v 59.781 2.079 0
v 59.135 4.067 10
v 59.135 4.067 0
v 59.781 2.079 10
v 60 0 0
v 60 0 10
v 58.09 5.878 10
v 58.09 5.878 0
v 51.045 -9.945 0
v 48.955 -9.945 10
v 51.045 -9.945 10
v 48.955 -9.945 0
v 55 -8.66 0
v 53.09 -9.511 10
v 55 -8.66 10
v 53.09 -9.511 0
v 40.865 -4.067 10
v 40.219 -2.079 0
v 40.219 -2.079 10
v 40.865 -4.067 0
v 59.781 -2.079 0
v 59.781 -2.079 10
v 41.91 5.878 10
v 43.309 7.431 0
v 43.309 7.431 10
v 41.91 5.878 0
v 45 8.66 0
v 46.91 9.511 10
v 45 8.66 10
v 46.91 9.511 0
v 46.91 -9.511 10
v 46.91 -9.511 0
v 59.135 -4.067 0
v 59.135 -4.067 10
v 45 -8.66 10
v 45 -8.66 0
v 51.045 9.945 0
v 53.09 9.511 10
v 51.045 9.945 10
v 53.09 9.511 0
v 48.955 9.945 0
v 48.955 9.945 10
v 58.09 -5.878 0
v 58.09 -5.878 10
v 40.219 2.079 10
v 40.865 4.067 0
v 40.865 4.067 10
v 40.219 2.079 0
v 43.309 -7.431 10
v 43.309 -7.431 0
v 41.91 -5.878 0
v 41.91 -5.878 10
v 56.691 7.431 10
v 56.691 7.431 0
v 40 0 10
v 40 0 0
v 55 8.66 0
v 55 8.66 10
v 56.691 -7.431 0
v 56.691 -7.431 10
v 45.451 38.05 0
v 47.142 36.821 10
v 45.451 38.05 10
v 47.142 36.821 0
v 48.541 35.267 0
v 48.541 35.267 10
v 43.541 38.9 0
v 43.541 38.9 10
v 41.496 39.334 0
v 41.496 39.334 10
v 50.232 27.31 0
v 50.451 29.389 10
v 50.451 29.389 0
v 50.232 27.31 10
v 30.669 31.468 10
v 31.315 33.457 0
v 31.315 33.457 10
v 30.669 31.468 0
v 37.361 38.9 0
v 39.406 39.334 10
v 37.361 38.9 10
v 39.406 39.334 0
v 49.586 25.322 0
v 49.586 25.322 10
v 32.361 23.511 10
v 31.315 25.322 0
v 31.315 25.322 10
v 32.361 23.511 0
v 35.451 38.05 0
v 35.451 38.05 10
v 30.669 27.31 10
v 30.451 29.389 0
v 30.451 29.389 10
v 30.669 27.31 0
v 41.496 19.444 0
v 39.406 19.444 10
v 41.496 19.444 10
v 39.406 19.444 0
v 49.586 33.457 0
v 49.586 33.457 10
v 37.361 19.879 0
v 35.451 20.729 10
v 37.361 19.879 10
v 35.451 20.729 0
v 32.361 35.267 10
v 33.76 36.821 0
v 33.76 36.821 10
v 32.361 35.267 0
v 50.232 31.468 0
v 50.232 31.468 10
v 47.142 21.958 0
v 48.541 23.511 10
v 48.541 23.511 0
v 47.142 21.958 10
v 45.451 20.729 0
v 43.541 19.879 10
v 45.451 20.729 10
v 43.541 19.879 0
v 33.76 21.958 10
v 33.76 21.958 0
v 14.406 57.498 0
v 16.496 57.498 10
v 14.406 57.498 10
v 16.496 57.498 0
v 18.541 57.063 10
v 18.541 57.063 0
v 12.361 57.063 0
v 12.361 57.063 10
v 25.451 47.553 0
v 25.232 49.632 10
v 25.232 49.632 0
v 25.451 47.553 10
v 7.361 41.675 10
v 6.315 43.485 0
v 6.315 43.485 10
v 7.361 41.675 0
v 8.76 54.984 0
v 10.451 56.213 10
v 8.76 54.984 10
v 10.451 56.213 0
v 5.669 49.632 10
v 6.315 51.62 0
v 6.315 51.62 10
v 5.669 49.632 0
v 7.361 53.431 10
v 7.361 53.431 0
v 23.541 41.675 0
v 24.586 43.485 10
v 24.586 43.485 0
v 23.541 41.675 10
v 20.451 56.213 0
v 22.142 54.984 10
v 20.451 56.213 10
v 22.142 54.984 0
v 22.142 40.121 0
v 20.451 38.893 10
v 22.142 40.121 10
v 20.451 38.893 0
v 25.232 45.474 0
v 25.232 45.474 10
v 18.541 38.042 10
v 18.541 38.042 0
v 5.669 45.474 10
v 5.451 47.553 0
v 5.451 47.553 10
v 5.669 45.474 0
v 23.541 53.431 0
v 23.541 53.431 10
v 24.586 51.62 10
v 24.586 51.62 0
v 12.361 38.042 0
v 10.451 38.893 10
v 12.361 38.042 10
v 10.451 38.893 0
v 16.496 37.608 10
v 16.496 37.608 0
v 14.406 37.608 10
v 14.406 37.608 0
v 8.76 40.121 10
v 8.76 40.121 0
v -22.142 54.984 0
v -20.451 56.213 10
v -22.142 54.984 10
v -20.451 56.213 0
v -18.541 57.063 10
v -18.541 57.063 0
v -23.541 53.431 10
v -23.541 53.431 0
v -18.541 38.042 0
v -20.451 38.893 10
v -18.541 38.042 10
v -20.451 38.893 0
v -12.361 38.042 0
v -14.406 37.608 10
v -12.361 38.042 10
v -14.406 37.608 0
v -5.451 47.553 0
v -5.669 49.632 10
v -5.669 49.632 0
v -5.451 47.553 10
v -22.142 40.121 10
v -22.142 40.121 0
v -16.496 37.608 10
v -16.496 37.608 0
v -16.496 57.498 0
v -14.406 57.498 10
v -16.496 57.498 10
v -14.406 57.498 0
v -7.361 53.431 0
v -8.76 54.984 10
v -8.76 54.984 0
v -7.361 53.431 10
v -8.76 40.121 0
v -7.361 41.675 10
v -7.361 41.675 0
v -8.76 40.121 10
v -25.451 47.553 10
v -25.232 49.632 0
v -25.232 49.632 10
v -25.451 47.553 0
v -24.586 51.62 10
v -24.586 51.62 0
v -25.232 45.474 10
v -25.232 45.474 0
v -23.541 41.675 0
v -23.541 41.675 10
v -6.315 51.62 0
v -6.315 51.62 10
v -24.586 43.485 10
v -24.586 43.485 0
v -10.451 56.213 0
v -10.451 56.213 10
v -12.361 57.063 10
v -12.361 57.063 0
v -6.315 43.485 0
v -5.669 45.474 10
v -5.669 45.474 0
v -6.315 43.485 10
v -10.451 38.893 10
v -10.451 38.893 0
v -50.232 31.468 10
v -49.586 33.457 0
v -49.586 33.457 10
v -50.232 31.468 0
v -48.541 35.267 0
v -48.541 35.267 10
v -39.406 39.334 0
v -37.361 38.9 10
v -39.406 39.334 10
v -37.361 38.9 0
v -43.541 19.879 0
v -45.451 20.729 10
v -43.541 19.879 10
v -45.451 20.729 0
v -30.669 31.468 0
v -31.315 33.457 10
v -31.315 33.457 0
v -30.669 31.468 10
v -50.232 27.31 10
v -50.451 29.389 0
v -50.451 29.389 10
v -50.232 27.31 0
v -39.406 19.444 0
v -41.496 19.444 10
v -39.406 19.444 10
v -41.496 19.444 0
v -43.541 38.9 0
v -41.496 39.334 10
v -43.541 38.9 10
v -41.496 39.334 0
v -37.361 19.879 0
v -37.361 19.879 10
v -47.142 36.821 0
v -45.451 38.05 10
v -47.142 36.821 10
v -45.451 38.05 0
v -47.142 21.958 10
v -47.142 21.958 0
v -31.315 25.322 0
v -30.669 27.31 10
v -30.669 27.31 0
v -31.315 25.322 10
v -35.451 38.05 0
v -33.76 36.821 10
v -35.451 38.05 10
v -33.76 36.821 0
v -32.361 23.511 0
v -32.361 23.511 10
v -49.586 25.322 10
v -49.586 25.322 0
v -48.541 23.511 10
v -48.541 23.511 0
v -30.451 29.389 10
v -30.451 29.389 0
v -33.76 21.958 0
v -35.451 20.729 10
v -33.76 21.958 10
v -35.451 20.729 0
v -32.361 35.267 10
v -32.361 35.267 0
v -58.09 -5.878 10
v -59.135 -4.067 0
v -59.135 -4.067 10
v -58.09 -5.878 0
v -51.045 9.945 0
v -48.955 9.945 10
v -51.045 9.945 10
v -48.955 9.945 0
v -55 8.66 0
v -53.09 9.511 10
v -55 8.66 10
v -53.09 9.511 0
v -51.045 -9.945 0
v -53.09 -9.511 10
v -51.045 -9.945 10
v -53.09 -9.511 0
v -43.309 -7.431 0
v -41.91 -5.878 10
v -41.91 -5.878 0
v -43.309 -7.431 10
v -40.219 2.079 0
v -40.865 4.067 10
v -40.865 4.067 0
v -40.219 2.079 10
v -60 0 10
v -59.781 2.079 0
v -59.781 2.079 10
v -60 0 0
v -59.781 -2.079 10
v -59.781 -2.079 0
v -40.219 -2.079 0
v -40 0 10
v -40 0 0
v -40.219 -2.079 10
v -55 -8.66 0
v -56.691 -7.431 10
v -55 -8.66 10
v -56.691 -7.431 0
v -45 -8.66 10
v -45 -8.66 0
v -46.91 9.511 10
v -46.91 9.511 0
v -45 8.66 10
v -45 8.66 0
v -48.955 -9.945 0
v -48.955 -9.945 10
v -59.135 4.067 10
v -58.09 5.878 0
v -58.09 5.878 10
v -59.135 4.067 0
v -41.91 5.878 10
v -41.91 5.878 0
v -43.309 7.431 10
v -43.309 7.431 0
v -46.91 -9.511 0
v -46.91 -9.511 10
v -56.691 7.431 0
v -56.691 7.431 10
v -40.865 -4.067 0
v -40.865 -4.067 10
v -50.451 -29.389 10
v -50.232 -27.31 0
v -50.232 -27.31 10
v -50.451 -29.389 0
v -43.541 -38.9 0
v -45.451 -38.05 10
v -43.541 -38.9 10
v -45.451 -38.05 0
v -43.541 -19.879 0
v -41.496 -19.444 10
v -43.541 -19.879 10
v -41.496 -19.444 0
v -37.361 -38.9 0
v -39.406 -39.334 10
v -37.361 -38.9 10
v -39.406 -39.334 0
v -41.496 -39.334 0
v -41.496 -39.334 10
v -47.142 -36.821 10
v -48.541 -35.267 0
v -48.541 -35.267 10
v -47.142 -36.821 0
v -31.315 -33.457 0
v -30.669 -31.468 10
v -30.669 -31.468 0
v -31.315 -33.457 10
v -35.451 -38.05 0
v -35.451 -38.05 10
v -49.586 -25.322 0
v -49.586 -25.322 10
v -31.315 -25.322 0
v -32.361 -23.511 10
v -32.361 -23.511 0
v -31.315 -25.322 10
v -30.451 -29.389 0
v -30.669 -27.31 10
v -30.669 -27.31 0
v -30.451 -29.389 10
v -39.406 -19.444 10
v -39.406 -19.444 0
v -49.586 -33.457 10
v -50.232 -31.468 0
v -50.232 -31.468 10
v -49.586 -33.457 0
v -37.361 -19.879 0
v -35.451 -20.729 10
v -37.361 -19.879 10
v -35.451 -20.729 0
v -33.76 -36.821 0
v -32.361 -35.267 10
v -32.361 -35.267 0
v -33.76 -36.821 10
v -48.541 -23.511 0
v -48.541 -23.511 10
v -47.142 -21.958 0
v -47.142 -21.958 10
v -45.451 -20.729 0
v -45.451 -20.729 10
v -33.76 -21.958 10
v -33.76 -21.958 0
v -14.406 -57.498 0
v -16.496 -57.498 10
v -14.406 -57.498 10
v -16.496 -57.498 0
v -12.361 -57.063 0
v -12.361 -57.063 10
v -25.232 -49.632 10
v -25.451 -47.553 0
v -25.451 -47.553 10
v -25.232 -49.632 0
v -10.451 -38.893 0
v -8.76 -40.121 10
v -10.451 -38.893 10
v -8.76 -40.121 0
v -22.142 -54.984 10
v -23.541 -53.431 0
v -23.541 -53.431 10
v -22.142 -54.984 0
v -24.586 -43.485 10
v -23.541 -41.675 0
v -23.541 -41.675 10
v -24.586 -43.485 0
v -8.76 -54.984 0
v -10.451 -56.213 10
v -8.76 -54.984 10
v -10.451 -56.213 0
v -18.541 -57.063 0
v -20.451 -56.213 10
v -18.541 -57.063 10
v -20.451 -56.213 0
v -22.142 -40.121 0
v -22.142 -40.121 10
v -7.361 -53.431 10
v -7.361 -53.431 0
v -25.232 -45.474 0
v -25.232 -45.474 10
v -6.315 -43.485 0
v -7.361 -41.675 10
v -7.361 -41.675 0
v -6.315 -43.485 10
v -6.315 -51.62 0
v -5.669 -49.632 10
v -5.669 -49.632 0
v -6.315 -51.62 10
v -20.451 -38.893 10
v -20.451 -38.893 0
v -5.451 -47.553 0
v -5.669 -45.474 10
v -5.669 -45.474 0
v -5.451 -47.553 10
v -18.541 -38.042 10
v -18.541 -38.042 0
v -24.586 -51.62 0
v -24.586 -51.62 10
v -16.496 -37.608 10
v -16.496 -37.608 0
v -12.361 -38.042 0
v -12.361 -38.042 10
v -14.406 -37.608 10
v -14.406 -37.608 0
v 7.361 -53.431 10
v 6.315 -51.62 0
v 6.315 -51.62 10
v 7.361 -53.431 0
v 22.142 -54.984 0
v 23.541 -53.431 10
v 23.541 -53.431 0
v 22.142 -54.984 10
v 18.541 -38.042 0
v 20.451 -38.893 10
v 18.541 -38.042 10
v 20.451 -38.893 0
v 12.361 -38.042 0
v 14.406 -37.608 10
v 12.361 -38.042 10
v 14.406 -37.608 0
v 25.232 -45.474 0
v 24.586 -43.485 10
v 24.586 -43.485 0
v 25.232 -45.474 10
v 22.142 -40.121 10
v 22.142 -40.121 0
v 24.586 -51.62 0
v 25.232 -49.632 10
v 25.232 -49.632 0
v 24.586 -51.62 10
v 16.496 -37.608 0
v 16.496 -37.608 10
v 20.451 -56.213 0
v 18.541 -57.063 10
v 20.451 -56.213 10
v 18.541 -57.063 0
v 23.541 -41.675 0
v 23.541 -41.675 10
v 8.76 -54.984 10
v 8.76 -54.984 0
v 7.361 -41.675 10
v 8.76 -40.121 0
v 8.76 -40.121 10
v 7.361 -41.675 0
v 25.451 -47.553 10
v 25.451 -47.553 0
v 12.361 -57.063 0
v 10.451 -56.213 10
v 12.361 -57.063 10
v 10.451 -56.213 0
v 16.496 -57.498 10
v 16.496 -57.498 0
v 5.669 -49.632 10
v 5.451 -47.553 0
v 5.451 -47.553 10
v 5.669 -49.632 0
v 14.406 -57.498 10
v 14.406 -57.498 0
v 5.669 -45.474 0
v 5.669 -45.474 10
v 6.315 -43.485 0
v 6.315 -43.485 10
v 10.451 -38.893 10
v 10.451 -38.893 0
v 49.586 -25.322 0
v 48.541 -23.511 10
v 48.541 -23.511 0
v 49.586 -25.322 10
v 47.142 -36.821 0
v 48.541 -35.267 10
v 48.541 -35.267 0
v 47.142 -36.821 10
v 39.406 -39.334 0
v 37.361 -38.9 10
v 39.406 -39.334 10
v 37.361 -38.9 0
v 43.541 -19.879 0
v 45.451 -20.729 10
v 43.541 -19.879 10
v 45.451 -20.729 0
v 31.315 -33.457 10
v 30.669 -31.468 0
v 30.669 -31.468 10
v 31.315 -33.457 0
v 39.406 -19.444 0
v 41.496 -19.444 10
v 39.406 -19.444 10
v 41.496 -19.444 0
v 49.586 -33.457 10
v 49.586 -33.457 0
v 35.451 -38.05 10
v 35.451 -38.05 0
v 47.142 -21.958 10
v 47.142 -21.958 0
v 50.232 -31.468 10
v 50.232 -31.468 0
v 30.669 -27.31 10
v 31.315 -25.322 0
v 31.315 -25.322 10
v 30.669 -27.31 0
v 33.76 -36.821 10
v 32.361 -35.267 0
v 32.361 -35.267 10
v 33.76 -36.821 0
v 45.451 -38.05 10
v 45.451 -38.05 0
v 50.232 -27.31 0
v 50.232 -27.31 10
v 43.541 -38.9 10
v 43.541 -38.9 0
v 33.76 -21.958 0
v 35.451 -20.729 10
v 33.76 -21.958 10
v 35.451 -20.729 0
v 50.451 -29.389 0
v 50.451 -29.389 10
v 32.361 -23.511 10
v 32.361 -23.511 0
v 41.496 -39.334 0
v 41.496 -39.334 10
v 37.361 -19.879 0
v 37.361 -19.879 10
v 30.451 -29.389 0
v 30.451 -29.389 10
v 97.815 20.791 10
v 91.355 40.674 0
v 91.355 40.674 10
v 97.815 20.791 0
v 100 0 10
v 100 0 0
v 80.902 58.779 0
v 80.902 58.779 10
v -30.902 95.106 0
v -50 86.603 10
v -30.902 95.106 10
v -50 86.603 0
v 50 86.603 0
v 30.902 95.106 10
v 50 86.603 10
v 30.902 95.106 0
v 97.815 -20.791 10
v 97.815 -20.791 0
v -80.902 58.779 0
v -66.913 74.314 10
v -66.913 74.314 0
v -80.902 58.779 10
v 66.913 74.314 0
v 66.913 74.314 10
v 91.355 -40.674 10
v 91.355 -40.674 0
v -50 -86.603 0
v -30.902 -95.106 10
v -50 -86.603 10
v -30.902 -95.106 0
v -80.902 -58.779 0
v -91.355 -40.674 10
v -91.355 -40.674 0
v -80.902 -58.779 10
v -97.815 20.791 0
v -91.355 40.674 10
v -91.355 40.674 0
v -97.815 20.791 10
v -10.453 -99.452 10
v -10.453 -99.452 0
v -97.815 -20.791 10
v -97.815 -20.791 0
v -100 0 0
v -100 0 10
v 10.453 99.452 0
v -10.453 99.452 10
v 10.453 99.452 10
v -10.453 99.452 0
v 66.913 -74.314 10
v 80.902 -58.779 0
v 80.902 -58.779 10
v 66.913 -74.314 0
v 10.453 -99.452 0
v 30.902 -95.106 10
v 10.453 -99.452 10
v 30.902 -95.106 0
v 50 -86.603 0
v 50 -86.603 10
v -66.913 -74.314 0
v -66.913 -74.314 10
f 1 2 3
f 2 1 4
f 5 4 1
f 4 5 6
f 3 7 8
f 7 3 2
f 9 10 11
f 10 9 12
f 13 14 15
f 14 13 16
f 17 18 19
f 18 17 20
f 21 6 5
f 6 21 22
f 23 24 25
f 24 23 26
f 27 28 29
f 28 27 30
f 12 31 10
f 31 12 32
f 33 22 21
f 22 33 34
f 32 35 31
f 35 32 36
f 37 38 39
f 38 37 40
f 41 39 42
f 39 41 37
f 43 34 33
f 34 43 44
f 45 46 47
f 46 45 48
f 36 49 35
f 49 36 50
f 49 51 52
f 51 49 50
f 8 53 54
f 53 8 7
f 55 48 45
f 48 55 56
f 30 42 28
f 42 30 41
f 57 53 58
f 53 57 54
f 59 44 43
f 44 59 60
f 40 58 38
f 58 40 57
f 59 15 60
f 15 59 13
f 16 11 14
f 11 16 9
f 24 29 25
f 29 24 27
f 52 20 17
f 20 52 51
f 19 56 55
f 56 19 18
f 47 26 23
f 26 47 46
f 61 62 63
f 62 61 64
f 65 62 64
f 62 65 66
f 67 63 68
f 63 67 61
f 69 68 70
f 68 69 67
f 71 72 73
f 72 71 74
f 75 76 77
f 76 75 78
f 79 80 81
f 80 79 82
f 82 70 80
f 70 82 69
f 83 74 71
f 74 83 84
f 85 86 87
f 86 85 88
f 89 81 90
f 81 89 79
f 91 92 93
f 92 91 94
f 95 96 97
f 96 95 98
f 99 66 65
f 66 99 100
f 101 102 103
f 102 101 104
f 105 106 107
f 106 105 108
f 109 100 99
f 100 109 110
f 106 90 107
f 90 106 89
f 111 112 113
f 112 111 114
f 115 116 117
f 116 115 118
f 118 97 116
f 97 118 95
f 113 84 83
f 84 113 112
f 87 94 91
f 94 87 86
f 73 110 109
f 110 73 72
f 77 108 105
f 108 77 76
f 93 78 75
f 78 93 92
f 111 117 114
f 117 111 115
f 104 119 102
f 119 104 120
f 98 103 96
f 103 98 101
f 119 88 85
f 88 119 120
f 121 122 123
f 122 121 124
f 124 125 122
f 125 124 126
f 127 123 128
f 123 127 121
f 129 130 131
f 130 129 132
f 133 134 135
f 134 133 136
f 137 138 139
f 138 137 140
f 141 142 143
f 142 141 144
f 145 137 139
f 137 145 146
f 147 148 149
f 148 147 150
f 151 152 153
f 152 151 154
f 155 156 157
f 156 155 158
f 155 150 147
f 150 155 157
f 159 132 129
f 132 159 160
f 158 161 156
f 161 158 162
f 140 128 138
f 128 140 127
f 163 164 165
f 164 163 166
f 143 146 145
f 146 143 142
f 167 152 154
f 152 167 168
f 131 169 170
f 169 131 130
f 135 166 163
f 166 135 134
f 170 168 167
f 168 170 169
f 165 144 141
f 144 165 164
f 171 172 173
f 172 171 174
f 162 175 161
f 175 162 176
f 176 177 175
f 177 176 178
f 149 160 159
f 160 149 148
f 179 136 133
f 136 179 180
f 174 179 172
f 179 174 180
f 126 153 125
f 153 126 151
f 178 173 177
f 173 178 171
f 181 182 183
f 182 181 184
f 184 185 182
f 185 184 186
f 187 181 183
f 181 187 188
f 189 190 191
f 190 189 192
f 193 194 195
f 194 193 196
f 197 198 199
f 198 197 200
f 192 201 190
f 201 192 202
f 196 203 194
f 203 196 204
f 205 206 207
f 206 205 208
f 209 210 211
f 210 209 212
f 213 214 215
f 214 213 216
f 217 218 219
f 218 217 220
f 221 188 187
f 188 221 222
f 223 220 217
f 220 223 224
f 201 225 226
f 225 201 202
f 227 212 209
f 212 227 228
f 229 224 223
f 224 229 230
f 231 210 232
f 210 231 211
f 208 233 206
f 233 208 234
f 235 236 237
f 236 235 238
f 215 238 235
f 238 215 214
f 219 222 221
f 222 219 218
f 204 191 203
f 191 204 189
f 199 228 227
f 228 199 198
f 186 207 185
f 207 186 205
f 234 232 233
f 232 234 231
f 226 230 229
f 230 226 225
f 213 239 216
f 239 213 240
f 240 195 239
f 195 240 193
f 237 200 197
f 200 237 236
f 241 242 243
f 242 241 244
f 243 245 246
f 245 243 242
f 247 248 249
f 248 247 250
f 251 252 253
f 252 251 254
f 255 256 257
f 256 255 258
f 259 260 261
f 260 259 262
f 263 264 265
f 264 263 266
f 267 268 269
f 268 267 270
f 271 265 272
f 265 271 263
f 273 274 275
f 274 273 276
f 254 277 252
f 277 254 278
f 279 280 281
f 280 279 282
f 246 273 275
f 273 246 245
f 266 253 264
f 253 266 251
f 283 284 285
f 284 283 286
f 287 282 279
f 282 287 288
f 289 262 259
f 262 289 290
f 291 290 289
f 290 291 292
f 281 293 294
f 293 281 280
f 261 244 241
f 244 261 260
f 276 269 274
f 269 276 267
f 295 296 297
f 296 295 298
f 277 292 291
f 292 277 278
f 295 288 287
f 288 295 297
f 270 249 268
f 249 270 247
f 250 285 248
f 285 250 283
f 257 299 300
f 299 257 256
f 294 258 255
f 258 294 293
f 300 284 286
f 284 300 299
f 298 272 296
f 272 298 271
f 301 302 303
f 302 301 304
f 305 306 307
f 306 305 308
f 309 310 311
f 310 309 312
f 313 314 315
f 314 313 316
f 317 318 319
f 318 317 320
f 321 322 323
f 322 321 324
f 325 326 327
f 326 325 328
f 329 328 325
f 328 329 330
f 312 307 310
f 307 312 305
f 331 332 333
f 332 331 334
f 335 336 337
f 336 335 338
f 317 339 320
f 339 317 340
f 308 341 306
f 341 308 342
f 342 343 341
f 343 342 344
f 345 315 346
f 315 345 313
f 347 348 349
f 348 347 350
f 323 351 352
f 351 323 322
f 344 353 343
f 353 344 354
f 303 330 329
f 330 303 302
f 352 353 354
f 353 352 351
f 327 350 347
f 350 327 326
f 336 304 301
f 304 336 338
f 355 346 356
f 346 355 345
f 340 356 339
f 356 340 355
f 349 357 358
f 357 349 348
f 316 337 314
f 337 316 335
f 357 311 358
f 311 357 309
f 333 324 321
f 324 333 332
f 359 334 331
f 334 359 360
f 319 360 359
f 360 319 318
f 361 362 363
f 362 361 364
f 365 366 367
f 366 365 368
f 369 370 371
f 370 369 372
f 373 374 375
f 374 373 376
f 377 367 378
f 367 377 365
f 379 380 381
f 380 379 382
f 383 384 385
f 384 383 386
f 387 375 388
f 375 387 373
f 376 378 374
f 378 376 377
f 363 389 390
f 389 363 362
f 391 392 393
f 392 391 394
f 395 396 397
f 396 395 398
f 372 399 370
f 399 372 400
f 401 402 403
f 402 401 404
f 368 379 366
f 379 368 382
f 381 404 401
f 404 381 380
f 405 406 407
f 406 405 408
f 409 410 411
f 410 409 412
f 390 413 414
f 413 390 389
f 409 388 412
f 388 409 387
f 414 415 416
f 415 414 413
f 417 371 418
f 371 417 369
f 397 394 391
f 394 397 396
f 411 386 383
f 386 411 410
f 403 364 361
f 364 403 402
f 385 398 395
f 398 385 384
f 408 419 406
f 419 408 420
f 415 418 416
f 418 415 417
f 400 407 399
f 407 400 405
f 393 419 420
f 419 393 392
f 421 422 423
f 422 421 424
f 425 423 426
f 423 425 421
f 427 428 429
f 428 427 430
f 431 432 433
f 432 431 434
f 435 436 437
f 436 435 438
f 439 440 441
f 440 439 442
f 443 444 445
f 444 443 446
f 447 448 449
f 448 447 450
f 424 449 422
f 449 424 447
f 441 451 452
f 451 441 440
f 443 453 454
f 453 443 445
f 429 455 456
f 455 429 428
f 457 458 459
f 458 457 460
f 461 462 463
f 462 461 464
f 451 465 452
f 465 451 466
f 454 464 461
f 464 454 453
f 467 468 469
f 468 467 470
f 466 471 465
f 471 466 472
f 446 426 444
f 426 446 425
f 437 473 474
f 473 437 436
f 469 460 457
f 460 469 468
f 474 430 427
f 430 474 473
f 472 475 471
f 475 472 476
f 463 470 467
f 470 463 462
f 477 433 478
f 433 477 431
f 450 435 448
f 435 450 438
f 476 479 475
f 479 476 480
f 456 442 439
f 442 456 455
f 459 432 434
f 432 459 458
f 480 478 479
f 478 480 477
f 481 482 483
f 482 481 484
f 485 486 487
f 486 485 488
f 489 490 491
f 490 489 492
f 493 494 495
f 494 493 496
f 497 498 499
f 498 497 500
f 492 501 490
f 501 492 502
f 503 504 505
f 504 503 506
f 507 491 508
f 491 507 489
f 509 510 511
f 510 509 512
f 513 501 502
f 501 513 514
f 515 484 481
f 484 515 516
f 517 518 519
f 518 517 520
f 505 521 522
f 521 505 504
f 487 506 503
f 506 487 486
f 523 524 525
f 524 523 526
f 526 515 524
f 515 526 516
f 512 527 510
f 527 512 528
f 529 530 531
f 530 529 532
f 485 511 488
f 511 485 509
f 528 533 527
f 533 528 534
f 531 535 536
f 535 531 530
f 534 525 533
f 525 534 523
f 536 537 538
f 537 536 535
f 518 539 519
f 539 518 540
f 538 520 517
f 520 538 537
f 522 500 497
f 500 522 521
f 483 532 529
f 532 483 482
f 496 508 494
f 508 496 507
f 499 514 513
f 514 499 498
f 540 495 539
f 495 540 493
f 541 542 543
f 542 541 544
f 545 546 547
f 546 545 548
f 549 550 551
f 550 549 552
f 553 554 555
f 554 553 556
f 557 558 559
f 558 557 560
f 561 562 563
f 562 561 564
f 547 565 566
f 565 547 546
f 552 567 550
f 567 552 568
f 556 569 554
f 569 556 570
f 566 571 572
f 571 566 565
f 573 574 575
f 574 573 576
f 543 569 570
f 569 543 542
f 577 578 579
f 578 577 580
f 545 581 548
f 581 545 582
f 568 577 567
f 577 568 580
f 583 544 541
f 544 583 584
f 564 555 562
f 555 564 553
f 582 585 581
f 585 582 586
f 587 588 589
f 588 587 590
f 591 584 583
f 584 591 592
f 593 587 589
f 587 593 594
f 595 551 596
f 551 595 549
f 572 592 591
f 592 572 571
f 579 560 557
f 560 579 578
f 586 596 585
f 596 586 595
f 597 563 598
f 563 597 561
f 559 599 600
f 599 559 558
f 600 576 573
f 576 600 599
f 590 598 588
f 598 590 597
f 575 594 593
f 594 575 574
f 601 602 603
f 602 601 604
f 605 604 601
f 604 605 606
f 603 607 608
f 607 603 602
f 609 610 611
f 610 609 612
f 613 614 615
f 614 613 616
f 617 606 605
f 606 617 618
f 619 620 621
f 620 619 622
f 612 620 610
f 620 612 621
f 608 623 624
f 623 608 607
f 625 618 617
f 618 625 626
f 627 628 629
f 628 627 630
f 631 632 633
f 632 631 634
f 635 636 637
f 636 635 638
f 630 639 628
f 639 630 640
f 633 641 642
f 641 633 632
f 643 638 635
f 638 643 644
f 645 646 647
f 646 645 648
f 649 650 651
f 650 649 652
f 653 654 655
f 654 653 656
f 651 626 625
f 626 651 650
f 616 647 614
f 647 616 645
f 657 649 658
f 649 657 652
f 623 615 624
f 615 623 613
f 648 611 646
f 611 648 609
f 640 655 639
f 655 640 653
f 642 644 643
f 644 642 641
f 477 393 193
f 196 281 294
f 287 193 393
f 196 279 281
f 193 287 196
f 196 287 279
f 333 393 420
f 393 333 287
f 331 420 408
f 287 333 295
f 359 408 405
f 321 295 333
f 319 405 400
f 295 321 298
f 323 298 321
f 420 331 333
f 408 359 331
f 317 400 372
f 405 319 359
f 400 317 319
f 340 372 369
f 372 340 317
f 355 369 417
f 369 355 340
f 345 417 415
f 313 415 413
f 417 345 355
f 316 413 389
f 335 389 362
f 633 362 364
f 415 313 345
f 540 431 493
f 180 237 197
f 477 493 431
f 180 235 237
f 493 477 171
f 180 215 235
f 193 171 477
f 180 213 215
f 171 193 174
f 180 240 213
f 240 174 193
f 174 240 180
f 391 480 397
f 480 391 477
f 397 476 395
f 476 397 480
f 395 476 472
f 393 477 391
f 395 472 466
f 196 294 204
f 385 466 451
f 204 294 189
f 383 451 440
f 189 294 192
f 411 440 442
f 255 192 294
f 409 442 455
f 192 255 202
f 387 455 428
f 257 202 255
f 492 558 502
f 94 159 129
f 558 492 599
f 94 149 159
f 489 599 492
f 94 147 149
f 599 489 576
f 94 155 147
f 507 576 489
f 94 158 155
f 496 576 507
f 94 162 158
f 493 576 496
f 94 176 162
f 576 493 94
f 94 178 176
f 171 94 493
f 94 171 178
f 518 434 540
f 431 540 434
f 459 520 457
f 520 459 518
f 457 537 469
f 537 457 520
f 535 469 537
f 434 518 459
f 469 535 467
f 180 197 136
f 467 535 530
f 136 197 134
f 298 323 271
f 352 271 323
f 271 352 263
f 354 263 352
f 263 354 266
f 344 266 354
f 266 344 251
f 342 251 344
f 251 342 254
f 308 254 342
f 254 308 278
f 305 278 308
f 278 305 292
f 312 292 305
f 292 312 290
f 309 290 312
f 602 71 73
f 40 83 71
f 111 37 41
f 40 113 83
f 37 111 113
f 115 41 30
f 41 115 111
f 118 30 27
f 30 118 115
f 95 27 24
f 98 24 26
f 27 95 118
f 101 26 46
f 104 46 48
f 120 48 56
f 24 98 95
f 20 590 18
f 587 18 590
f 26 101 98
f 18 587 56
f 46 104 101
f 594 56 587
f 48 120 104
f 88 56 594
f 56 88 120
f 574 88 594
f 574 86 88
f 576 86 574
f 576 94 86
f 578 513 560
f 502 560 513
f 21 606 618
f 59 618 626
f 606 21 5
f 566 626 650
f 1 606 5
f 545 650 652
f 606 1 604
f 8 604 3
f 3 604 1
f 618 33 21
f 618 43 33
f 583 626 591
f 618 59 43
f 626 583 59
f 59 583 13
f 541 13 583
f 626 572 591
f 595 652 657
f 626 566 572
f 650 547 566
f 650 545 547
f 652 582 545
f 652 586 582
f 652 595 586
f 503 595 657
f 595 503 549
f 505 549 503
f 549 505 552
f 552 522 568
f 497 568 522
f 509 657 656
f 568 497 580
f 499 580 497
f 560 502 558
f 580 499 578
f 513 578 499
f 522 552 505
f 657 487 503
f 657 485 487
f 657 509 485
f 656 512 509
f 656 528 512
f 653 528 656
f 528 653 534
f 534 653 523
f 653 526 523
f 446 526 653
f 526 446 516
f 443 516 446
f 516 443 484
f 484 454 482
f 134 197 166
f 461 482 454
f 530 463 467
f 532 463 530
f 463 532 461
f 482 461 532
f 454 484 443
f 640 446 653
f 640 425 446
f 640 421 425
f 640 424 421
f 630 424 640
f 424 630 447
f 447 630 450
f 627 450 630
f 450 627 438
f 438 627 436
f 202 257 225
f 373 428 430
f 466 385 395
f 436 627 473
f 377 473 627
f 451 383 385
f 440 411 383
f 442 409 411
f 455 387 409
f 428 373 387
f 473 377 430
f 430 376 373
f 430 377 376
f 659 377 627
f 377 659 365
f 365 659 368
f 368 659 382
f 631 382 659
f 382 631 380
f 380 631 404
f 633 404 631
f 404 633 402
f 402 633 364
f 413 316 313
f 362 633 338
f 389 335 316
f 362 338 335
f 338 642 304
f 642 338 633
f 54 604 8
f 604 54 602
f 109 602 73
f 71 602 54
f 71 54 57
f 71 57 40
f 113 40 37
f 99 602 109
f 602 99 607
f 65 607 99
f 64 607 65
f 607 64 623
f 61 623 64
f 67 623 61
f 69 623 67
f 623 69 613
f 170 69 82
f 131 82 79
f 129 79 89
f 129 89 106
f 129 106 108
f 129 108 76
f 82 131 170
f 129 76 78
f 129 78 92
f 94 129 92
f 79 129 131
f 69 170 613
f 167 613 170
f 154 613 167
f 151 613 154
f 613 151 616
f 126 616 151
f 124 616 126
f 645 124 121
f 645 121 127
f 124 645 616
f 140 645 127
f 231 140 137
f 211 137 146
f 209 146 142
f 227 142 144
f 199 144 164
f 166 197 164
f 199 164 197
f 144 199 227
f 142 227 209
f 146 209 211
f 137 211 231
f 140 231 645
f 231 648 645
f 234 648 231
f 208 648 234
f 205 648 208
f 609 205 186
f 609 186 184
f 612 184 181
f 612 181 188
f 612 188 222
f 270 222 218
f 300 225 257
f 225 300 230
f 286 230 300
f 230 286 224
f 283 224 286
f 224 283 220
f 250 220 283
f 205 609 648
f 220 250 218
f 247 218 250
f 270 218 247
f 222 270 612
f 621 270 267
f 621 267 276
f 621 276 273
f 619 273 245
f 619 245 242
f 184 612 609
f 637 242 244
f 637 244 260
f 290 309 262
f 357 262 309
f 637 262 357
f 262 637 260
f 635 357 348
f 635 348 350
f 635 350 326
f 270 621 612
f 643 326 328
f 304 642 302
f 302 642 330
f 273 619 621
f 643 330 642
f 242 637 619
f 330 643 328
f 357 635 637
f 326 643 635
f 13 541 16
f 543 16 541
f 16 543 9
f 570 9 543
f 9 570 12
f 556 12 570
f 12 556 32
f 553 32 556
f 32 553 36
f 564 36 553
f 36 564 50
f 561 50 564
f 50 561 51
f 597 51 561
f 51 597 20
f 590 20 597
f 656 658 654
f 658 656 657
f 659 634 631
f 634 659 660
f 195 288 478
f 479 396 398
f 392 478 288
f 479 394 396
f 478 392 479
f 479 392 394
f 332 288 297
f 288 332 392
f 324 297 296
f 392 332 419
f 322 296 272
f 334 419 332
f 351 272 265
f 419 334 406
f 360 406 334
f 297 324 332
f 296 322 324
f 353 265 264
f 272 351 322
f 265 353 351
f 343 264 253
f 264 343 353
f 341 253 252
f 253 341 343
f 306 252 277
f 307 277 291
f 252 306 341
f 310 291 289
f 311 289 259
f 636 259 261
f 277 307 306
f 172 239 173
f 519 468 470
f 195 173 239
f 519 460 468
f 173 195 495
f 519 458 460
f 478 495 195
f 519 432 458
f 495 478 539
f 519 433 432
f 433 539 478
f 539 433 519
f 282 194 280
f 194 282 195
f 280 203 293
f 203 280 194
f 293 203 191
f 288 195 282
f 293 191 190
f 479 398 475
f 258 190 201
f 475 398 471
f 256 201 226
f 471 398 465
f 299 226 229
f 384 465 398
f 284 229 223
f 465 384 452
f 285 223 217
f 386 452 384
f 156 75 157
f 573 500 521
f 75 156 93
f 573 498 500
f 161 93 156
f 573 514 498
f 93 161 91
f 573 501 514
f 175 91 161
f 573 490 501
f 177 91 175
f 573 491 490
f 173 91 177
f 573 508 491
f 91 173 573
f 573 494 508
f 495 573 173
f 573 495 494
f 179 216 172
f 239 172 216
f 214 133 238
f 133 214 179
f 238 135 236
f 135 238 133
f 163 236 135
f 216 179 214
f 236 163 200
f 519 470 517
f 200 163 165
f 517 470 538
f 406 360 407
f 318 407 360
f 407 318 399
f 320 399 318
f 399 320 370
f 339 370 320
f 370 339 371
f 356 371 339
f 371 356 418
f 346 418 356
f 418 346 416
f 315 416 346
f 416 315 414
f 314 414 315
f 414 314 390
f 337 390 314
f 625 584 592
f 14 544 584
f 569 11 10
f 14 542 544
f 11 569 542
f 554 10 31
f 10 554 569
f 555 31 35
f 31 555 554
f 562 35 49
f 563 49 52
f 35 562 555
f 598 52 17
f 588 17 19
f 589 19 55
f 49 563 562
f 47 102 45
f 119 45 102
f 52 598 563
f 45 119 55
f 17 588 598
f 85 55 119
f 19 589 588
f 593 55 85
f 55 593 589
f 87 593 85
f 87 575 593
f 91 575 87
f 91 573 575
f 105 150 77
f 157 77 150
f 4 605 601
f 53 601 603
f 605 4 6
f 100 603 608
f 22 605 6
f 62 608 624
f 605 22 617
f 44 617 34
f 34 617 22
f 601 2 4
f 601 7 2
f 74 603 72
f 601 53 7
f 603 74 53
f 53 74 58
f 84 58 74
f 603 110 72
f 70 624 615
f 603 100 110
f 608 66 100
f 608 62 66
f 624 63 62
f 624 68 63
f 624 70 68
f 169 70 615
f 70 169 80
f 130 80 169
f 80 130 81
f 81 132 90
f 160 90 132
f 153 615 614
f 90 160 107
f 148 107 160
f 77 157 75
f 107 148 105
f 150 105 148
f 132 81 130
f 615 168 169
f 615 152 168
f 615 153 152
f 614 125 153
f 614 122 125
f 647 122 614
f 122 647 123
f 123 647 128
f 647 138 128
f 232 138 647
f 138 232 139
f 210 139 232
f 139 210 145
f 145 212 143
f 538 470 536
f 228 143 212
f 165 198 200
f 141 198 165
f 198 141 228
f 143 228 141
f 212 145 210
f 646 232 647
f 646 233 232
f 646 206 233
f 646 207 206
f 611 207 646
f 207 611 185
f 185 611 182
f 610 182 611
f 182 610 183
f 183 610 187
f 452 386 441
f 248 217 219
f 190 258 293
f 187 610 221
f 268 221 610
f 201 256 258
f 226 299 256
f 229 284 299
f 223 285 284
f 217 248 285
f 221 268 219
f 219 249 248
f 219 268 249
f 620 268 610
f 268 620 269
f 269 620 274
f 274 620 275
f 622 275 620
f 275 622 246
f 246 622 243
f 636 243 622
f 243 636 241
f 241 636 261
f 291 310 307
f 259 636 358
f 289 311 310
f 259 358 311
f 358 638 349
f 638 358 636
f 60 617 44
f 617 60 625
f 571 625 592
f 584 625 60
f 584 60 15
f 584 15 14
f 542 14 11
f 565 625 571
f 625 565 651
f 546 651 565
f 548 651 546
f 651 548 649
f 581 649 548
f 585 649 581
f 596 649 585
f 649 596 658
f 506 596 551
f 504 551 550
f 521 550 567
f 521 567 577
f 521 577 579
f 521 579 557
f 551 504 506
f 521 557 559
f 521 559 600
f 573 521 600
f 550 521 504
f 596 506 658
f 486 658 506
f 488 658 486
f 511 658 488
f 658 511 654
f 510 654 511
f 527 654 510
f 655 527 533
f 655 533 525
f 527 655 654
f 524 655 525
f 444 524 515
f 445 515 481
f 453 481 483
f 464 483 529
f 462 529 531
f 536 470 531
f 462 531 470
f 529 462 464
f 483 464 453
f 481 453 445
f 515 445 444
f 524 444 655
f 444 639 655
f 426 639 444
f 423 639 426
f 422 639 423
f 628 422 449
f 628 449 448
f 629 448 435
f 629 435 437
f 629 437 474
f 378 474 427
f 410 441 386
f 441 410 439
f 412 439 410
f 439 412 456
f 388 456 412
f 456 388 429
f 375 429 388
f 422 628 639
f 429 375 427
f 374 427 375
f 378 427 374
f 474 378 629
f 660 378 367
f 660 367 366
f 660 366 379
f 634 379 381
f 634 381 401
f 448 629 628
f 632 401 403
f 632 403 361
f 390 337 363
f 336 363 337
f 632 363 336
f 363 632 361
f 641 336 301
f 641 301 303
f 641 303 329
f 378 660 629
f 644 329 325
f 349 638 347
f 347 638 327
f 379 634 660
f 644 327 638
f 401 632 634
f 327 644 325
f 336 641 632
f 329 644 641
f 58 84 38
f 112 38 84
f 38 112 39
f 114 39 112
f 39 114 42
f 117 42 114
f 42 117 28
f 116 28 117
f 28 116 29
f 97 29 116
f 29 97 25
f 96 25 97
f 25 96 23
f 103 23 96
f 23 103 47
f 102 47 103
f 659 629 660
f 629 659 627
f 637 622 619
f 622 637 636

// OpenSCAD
module roata(raza, grosime, raza_gaura, nr_gauri)
    {
        difference() {
        cylinder(h=grosime, r=raza);
            for(i=[0:360/nr_gauri:359])
                rotate([0,0,i])
            translate([raza/2,0,-1])
            cylinder(r=raza_gaura, h=grosime+2);
        }
   }
   rotate([0,0,$t*360])
  
 roata(raza=100, grosime=10, raza_gaura=10, nr_gauri=10);
        
